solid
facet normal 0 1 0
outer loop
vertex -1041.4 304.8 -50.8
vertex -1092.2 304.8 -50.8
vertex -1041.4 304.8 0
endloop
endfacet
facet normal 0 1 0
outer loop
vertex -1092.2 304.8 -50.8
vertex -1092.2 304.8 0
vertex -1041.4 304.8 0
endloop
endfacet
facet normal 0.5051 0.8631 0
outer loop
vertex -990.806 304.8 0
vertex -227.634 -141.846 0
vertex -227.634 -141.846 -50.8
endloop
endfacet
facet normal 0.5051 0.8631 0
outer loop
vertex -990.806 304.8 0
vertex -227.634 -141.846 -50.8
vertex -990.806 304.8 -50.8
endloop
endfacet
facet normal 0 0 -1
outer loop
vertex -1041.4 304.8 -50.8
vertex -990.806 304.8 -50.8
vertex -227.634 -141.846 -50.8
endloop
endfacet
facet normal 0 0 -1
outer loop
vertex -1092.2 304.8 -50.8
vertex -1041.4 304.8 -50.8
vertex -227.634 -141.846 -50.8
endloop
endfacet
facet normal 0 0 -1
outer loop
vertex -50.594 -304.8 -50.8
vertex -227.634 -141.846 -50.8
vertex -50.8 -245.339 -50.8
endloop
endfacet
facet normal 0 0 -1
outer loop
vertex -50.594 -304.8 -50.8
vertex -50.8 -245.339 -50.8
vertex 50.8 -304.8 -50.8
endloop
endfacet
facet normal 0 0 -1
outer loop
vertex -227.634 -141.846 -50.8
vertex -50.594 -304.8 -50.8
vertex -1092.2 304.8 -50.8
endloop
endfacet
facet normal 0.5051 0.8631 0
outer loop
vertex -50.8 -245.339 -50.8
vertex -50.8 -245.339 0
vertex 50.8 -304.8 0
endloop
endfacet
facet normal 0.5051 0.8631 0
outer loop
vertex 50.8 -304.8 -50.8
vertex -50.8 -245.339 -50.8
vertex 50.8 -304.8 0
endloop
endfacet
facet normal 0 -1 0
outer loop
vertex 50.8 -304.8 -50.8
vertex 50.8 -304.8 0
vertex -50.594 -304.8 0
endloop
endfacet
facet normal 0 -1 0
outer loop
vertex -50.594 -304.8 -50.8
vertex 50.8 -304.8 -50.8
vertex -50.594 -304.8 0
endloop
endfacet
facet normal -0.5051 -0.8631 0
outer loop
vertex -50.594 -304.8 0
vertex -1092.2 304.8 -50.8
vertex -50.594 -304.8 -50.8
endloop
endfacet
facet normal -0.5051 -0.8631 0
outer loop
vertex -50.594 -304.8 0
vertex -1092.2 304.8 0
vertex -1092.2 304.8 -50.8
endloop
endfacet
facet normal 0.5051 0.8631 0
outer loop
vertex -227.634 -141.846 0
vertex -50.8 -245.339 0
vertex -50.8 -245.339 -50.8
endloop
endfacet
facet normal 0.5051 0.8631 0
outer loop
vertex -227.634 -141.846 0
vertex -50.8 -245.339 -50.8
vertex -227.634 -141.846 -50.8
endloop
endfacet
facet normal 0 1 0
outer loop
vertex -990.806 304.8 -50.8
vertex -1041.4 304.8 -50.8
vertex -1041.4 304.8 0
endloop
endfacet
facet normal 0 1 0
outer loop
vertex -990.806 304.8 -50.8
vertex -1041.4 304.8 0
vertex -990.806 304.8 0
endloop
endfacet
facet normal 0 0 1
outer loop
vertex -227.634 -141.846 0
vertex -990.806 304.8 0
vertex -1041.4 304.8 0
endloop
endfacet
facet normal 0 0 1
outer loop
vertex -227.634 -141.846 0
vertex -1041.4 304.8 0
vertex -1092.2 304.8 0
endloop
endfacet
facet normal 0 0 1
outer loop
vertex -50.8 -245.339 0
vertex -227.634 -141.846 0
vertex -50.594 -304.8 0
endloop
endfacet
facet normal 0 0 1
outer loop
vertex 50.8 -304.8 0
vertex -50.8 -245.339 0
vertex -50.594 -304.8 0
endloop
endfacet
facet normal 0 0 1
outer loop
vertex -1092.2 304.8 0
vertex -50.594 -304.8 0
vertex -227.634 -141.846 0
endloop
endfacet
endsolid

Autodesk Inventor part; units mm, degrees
ref_plane "YZ Plane" through (0, 0, 0) normal (1, 0, 0) x (0, 1, 0)
ref_plane "XZ Plane" through (0, 0, 0) normal (0, 1, 0) x (-1, 0, 0)
ref_plane "XY Plane" through (0, 0, 0) normal (0, 0, 1) x (1, 0, 0)
ref_plane "Work Plane1" through (0, 0, 0) normal (0, 0, 1) x (1, 0, 0)
sketch "Sketch1" plane through (0, 0, 0) normal (0, 0, 1) x (1, 0, 0)
  line L0 (-1092.2, 304.8) -> (-1041.4, 304.8) projected
  line L1 (-50.8, -245.3386) -> (50.8, -304.8) projected
  line L2 (-1041.4, 304.8) -> (1524, 304.8) projected
  line L3 (-990.8062, 304.8) -> (-1092.2, 304.8)
  line L4 (-990.8062, 304.8) -> (-1092.2, 304.8)
  line L5 (-990.8062, 304.8) -> (-1092.2, 304.8)
  line L6 (50.8, -304.8) -> (-227.6342, -141.8464)
  line L7 (-227.6342, -141.8464) -> (-990.8062, 304.8)
  line L8 (-990.8062, 304.8) -> (-1092.2, 304.8)
  line L9 (-1092.2, 304.8) -> (-50.5938, -304.8)
  line L10 (50.8, -304.8) -> (-50.5938, -304.8)
  point P0 (-905.0447, 254.6081)
  point P1 (-930.9134, 210.407)
  point P2 (-162.6995, -179.8494)
extrude "Extrusion1" add sketch "Sketch1" against normal blind 50.8
properties part number "2x4x(24x43)"
